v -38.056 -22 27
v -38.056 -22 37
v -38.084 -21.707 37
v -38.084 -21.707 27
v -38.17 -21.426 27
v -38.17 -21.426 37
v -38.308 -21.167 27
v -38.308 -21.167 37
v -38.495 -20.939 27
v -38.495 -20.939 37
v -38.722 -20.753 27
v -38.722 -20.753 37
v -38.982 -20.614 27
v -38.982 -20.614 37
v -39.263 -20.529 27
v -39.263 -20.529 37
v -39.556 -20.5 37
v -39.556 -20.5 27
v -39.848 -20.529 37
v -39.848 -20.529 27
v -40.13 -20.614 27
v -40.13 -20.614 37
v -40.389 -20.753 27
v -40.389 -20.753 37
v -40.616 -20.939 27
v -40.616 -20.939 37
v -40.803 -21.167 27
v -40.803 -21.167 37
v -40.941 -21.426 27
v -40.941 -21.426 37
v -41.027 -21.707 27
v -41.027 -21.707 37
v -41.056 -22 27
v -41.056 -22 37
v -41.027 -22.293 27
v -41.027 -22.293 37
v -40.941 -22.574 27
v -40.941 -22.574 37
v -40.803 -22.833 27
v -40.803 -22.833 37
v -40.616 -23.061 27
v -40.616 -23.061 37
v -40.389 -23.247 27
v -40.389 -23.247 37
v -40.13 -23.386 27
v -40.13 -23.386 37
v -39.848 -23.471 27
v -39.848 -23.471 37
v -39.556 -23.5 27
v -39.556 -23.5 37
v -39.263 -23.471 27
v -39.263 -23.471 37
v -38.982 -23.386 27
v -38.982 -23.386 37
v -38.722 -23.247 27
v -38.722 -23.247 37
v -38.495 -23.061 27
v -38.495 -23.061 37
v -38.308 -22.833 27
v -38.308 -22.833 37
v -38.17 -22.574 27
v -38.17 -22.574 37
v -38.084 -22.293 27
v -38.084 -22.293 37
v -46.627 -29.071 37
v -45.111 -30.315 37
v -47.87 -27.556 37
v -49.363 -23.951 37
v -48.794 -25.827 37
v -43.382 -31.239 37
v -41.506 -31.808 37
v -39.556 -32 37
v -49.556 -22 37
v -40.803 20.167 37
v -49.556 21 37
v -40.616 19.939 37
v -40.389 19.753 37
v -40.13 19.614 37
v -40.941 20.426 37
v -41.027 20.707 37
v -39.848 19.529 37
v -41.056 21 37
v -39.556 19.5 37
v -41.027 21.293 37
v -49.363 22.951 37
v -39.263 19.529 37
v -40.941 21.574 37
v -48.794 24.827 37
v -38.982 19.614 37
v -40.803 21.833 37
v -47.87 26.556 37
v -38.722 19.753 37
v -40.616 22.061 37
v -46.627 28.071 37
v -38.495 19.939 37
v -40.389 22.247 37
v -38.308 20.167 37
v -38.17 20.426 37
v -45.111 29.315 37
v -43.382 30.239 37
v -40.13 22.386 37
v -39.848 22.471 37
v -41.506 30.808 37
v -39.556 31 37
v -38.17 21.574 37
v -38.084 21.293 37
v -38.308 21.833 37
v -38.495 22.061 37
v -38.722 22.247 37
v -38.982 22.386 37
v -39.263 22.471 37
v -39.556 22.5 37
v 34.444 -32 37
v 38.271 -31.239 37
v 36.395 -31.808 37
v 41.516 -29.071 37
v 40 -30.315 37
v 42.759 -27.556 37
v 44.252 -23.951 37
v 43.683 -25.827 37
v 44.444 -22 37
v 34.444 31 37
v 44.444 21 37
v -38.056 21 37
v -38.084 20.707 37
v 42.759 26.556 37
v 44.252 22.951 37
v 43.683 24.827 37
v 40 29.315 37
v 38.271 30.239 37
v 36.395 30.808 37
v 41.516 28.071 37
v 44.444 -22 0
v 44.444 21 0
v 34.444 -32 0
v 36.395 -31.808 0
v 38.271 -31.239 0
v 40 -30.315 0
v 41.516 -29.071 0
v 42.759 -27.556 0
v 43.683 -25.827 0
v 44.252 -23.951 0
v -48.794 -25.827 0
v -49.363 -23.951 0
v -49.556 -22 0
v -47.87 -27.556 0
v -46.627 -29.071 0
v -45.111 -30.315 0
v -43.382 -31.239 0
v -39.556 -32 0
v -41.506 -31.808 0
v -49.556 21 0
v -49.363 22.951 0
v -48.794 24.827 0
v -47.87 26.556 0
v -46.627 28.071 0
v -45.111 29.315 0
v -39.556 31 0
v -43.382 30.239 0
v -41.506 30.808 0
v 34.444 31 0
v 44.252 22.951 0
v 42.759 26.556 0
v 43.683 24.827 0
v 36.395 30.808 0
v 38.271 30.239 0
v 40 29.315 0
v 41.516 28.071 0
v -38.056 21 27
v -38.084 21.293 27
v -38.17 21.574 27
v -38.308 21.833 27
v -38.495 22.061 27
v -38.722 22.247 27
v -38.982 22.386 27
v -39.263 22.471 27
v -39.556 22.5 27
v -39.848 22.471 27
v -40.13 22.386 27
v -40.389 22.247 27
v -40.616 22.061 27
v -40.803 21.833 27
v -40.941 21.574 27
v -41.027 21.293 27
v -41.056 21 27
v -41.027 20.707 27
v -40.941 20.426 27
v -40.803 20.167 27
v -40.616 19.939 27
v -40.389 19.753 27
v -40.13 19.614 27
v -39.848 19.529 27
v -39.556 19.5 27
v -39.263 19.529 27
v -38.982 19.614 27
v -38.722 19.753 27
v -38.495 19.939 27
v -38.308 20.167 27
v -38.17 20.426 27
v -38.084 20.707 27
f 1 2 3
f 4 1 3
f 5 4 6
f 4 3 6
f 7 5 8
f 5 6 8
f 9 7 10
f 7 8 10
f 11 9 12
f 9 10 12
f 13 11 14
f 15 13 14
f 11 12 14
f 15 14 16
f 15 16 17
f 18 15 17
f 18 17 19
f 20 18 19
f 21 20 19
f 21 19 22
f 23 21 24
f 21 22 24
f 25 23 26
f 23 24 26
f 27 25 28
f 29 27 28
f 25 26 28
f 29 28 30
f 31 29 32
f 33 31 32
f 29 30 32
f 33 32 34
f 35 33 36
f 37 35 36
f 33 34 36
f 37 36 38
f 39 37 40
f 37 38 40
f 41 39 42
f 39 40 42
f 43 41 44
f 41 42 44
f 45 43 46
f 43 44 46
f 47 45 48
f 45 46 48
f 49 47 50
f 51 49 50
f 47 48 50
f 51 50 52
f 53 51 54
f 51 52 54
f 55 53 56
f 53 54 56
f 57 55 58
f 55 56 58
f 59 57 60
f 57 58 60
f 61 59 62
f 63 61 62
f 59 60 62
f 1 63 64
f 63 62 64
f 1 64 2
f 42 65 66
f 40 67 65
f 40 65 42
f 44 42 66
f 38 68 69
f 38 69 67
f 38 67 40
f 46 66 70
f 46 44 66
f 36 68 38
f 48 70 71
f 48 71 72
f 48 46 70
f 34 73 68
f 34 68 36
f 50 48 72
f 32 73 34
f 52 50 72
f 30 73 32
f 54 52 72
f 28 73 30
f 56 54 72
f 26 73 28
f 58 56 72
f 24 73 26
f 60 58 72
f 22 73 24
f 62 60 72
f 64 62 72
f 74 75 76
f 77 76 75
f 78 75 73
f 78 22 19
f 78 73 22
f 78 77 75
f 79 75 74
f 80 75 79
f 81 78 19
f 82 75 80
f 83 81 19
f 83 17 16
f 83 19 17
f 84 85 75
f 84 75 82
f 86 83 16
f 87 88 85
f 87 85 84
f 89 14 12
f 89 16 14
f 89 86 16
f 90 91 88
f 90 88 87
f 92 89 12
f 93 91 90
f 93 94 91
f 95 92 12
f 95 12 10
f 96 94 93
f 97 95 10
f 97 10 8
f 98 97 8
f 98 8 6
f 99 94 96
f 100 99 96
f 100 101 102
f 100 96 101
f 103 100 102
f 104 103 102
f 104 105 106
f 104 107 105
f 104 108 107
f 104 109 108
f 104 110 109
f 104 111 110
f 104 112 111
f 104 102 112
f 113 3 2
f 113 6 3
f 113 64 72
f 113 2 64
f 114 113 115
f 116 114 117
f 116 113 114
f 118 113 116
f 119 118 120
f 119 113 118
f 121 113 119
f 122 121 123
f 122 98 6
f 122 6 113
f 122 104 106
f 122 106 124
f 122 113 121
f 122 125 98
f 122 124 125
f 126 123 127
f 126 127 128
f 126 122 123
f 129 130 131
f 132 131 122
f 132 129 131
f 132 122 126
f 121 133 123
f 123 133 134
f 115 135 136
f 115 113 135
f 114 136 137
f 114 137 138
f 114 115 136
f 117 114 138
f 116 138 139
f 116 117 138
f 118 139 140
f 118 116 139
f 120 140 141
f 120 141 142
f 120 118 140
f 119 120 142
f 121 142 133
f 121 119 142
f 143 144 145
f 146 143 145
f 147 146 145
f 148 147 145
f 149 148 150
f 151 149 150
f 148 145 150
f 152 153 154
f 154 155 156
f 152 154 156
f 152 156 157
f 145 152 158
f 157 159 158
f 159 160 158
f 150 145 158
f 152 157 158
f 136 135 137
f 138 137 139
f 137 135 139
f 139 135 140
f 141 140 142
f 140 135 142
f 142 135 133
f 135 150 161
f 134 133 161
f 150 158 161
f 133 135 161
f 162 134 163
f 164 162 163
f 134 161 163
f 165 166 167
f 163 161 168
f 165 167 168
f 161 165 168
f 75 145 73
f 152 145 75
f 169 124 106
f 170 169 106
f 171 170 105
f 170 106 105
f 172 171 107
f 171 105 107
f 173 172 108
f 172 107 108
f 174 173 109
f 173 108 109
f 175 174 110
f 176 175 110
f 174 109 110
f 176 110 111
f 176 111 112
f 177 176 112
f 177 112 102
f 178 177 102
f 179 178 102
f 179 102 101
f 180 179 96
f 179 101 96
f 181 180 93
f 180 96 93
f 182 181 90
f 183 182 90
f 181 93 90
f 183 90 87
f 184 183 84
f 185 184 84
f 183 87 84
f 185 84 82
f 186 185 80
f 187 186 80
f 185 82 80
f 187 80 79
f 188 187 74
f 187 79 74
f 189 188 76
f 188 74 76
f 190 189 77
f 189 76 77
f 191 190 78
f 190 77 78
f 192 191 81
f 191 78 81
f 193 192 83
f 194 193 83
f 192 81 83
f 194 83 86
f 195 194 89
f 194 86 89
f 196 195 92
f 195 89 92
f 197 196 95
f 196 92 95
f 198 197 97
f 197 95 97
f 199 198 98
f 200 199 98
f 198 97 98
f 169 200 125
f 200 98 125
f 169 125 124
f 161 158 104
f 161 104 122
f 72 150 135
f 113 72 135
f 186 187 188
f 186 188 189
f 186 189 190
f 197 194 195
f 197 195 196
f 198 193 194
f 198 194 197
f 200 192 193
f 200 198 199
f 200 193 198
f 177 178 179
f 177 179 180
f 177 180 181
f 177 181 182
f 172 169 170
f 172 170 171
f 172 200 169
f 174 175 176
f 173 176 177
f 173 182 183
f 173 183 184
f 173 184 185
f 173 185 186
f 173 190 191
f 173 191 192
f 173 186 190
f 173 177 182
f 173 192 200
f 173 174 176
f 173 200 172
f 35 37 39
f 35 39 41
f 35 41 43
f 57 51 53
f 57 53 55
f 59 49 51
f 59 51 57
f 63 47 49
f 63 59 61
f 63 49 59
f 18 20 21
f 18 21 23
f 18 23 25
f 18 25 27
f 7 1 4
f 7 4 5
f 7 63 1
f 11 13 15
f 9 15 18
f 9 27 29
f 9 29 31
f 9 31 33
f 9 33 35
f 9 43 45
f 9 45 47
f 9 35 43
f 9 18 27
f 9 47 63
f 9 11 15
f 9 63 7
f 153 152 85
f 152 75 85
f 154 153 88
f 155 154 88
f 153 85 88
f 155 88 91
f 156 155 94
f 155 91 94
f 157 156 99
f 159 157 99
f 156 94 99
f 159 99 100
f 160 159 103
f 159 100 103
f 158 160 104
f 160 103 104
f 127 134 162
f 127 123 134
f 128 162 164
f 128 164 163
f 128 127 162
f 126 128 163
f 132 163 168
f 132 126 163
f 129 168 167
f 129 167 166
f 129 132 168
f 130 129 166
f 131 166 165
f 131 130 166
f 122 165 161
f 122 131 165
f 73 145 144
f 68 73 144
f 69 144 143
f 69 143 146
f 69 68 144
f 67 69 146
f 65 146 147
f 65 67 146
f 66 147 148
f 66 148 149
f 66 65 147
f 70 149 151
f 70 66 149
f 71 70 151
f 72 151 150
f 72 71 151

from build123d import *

# Parameters (mm, degrees)
SKETCH_1_W          = 94
SKETCH_1_H          = 63
EXTRUDE_1_DEPTH     = 37
FILLET_1_R          = 10
SKETCH_3_R          = 1.5
CUT_EXTRUDE_1_DEPTH = 10


with BuildPart() as part:
    # 草图1 → 凸台-拉伸1 (new body)
    with BuildSketch(Plane.XY):
        with Locations((-2.555555556, -0.5)):
            Rectangle(SKETCH_1_W, SKETCH_1_H)
    extrude(amount=EXTRUDE_1_DEPTH)

    # 圆角1
    fillet_1_edges = [part.edges().sort_by_distance(p)[0] for p in [
        (-49.555555556, 31, 18.5),
        (44.444444444, 31, 18.5),
        (44.444444444, -32, 18.5),
        (-49.555555556, -32, 18.5),
    ]]
    fillet(fillet_1_edges, radius=FILLET_1_R)

    # 草图3 → 切除-拉伸1 (cut)
    with BuildSketch(Plane.XY.offset(37)):
        with Locations((-39.555555556, -22)):
            Circle(SKETCH_3_R)
        with Locations((-39.555555556, 21)):
            Circle(SKETCH_3_R)
    extrude(amount=-CUT_EXTRUDE_1_DEPTH, mode=Mode.SUBTRACT)


solid = part.part
